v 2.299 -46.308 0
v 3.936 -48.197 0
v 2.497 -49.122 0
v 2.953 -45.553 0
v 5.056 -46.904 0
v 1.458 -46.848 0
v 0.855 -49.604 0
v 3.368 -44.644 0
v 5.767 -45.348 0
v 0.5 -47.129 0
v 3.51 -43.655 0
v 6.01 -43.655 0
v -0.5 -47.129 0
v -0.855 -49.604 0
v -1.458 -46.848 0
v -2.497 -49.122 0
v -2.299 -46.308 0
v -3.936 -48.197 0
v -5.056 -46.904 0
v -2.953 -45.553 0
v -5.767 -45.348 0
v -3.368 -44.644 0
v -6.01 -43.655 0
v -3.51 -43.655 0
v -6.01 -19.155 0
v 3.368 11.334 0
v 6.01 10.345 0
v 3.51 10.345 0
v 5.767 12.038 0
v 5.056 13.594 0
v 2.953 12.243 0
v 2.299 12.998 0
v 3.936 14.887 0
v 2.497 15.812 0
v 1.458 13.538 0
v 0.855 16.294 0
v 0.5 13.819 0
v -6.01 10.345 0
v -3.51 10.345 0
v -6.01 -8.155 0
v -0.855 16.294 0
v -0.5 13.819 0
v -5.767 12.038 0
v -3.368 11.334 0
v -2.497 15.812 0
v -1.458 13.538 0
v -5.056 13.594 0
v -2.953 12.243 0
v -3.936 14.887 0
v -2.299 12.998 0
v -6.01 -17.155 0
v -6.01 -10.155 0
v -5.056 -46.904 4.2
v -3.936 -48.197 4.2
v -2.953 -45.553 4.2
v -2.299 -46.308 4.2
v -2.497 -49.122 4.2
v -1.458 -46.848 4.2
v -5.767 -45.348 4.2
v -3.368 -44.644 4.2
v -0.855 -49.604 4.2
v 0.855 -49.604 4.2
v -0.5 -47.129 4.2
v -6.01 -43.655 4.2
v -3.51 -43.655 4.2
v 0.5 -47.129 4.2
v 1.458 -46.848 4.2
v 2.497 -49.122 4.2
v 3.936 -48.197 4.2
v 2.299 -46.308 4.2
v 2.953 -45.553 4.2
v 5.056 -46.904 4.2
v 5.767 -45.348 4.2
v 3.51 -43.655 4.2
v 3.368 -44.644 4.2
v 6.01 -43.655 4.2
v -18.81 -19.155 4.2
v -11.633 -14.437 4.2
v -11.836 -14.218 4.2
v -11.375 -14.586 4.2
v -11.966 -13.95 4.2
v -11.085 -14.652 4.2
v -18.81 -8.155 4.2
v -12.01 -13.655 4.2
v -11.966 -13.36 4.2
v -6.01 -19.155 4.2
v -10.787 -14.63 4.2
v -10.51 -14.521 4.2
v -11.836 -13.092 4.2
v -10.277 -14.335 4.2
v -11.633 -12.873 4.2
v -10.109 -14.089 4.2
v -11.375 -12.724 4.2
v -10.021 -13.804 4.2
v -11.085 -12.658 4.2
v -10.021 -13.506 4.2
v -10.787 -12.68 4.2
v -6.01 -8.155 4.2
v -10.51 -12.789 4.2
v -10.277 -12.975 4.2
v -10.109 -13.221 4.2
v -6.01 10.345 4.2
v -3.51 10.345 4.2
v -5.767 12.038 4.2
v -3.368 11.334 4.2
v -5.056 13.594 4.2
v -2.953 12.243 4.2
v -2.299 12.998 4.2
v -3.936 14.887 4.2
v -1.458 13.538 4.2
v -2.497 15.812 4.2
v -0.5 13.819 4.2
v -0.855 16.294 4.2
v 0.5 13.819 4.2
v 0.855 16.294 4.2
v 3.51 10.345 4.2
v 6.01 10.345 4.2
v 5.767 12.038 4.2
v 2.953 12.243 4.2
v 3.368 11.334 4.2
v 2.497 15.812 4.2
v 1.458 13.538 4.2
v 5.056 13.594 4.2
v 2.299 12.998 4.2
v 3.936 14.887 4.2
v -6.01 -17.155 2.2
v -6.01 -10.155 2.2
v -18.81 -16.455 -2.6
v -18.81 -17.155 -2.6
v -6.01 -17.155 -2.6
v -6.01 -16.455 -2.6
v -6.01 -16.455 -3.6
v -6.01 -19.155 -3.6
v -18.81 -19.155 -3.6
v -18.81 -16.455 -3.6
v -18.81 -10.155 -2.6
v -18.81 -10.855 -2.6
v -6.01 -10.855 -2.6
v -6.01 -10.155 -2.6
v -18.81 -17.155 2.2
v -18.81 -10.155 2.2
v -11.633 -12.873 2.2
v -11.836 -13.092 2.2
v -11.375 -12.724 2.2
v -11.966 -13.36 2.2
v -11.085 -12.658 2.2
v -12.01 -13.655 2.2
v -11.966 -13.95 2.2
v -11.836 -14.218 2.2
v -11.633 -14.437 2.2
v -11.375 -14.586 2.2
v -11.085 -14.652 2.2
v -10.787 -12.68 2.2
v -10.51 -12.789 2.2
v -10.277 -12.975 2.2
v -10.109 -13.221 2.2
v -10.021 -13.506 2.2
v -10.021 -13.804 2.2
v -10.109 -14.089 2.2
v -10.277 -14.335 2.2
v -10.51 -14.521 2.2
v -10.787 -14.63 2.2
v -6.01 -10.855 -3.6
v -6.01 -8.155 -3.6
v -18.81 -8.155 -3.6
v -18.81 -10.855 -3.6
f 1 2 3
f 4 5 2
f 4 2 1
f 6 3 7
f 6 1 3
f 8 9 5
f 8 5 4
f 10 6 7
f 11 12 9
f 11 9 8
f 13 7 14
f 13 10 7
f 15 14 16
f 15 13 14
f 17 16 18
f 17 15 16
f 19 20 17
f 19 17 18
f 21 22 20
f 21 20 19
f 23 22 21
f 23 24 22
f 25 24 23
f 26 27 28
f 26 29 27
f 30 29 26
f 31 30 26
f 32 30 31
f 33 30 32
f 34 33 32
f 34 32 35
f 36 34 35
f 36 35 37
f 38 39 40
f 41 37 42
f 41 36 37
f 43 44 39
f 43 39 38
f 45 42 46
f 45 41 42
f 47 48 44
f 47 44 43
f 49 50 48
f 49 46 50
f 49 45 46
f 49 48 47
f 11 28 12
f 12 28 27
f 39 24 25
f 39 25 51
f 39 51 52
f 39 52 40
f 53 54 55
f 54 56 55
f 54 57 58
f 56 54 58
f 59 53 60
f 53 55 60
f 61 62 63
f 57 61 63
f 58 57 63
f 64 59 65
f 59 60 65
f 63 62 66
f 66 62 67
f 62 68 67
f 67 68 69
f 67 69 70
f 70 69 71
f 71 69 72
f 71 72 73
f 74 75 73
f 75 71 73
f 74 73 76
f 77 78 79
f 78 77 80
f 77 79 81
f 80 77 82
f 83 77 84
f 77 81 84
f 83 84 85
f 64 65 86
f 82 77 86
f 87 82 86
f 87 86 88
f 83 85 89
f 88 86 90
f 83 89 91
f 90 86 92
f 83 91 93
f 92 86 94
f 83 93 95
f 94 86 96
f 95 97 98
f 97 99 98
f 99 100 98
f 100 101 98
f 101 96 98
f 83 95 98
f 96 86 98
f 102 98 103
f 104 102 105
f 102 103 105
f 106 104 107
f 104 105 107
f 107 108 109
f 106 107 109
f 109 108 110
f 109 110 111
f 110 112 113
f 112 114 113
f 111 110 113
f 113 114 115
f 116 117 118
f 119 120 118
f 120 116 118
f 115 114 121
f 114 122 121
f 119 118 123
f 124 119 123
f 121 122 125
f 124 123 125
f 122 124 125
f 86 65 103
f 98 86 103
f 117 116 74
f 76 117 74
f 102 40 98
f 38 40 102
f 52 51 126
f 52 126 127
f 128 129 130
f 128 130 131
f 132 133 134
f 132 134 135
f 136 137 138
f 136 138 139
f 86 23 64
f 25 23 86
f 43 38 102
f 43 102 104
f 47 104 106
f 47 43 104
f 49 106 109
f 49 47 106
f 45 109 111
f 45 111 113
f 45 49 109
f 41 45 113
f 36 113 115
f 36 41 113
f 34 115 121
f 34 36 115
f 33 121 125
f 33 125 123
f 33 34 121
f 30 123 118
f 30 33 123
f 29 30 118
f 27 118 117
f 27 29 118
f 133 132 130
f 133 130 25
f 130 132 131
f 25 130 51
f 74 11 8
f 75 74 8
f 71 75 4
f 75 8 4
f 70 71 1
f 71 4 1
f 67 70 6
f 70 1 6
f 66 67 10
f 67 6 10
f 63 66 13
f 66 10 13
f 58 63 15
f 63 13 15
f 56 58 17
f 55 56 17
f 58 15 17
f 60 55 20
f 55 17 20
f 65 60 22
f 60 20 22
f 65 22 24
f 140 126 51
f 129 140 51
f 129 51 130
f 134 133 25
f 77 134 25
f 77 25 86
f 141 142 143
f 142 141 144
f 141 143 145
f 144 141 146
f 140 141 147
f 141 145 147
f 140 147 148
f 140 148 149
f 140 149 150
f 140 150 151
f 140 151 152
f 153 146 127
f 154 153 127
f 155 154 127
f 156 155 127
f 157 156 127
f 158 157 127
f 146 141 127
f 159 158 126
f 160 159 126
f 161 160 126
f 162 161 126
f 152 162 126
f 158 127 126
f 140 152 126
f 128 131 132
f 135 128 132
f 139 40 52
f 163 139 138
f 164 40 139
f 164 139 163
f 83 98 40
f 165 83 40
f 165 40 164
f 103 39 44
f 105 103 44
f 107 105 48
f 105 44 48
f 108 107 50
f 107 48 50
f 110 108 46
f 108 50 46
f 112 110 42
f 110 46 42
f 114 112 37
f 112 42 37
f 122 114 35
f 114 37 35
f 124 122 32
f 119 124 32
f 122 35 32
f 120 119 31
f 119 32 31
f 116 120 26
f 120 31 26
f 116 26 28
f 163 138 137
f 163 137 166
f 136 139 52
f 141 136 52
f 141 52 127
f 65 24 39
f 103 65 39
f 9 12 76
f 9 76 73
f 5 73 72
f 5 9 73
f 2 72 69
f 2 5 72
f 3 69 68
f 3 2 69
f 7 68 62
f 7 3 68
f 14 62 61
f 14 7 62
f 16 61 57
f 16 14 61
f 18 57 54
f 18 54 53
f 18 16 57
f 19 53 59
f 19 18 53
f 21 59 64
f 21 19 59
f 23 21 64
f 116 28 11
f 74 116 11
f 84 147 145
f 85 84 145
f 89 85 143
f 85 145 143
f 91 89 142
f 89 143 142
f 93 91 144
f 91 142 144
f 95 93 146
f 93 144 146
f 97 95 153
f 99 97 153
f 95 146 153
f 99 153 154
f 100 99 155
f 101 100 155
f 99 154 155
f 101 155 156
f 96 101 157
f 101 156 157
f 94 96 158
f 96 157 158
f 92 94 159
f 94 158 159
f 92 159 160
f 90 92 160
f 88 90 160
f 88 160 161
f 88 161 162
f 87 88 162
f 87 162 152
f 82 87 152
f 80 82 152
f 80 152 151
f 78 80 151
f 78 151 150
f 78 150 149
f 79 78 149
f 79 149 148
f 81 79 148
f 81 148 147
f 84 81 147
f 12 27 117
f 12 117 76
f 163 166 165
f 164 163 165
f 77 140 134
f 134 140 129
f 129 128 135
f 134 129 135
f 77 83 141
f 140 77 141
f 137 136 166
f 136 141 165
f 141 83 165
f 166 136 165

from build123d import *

# Parameters (mm, degrees)
EXTRUDE_1_DEPTH     = 4.2
EXTRUDE_2_DEPTH     = 12.8
SKETCH_3_R          = 1
CUT_EXTRUDE_1_DEPTH = 10
SKETCH_5_W          = 1
SKETCH_5_H          = 2.7
EXTRUDE_3_DEPTH     = 12.8


with BuildPart() as part:
    # 草图1 → 凸台-拉伸1 (new body)
    with BuildSketch(Plane.XY):
        with BuildLine():
            Line((6.01, 10.345093063), (6.01, -43.654906937))
            ThreePointArc((6.01, -43.654906937), (0, -49.664906937), (-6.01, -43.654906937))
            Line((-6.01, -43.654906937), (-6.01, 10.345093063))
            ThreePointArc((-6.01, 10.345093063), (0, 16.355093063), (6.01, 10.345093063))
        make_face()
        with BuildLine():
            Line((3.51, 10.345093063), (3.51, -43.654906937))
            ThreePointArc((3.51, -43.654906937), (0, -47.164906937), (-3.51, -43.654906937))
            Line((-3.51, -43.654906937), (-3.51, 10.345093063))
            ThreePointArc((-3.51, 10.345093063), (0, 13.855093063), (3.51, 10.345093063))
        make_face(mode=Mode.SUBTRACT)
    extrude(amount=EXTRUDE_1_DEPTH)

    # 草图2 → 凸台-拉伸2 (add)
    with BuildSketch(Plane.ZY.offset(6.01)):
        Polygon((4.2, -16.654906937), (4.2, -8.154906937), (-2.6, -8.154906937), (-2.6, -10.154906937), (2.2, -10.154906937), (2.2, -17.154906937), (-2.6, -17.154906937), (-2.6, -19.154906937), (4.2, -19.154906937), align=None)
    extrude(amount=EXTRUDE_2_DEPTH)

    # 草图3 → 切除-拉伸1 (cut)
    with BuildSketch(Plane(origin=(0, 0, 2.2), x_dir=(-1, 0, 0), z_dir=(0, 0, -1))):
        with Locations((11.01, -13.654906937)):
            Circle(SKETCH_3_R)
    extrude(amount=-CUT_EXTRUDE_1_DEPTH, mode=Mode.SUBTRACT)

    # 草图5 → 凸台-拉伸3 (add, through all)
    with BuildSketch(Plane(origin=(-6.01, 0, 0), x_dir=(0, 0, -1), z_dir=(1, 0, 0))):
        with Locations((3.1, -9.504906937)):
            Rectangle(SKETCH_5_W, SKETCH_5_H)
        with Locations((3.1, -17.804906937)):
            Rectangle(SKETCH_5_W, SKETCH_5_H)
    extrude(amount=-EXTRUDE_3_DEPTH)


solid = part.part
